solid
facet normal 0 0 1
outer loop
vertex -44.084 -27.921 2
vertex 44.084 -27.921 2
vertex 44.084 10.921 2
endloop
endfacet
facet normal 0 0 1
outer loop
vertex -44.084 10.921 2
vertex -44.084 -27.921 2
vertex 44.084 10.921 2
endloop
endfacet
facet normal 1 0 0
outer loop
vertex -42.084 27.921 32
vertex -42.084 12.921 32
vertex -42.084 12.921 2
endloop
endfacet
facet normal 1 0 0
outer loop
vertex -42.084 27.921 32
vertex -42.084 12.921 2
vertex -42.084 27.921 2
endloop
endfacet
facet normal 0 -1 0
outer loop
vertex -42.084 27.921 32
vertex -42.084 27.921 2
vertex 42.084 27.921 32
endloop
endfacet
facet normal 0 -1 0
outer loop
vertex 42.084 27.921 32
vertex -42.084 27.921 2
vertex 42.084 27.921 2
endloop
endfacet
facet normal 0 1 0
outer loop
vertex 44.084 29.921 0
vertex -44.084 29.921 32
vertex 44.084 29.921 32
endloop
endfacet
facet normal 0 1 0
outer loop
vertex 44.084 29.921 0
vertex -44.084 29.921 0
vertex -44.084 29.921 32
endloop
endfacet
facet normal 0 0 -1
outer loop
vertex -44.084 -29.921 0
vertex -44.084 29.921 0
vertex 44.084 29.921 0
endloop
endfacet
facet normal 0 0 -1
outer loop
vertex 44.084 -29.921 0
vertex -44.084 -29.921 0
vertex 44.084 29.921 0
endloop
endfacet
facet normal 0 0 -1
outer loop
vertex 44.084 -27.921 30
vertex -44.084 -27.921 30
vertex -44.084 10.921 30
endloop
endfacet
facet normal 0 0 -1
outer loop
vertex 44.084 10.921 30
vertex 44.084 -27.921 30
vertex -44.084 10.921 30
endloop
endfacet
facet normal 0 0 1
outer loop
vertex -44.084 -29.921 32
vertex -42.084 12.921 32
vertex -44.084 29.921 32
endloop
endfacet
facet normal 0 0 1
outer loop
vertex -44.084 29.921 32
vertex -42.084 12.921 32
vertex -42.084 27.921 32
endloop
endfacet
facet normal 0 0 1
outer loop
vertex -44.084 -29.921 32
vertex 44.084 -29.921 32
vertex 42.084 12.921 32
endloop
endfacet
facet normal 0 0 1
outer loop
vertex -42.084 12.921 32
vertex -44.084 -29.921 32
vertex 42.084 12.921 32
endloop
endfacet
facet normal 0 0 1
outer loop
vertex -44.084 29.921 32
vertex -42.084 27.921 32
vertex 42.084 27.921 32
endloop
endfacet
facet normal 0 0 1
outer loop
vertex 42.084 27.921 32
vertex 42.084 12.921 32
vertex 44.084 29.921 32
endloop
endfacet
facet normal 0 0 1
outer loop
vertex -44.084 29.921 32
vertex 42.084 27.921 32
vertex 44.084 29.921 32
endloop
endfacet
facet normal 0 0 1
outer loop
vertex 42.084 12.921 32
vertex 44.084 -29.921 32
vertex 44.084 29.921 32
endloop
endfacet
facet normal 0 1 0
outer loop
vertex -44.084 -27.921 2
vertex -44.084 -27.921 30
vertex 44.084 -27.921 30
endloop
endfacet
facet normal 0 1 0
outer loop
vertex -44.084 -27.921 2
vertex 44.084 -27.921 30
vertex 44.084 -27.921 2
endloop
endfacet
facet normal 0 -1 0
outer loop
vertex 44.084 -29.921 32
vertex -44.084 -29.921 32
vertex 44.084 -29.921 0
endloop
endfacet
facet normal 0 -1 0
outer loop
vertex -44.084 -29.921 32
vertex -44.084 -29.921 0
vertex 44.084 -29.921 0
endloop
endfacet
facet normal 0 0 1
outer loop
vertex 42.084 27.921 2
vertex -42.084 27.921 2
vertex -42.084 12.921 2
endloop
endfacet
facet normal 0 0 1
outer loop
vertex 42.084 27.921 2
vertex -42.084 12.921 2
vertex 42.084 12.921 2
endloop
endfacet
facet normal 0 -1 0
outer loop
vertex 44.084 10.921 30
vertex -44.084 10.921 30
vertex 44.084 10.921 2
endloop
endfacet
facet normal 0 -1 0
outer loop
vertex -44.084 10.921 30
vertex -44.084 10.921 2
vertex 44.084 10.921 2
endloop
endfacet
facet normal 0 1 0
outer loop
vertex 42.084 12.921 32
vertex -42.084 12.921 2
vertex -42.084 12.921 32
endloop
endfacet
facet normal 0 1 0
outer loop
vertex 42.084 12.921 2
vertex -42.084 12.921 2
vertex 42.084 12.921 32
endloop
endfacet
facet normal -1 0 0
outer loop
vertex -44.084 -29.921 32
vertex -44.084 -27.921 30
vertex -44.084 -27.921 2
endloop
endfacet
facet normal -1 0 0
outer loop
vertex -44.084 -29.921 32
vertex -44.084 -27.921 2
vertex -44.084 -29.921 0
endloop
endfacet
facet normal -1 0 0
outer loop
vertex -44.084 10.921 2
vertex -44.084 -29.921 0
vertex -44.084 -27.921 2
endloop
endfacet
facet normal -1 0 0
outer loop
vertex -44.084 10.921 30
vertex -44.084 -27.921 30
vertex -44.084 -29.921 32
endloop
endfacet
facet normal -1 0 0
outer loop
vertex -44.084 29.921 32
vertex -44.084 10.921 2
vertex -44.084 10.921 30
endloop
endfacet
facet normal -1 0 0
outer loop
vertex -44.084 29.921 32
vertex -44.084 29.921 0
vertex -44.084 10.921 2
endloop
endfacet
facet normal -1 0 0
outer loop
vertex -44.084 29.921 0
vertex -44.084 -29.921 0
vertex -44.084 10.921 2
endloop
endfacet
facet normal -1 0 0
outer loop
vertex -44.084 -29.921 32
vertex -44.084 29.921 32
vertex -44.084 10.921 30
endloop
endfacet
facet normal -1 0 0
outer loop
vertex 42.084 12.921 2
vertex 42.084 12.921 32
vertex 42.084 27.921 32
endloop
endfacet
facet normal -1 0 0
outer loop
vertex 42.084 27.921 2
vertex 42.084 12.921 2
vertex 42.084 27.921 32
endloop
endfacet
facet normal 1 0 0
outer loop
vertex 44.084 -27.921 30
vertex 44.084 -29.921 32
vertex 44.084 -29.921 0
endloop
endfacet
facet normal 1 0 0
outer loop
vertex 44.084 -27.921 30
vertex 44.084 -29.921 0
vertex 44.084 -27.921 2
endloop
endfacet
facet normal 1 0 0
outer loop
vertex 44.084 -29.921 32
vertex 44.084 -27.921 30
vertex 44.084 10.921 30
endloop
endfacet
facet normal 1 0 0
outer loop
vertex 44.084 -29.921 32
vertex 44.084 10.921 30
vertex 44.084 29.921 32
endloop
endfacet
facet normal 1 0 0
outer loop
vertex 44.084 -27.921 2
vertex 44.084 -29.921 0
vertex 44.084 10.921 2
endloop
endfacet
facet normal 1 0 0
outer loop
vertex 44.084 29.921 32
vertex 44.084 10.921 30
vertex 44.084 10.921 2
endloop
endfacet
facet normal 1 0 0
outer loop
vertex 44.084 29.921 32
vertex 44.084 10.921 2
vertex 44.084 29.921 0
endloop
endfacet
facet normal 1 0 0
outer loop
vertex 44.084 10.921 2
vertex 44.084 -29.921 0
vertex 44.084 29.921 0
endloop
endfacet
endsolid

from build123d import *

# Parameters (mm, degrees)
SKETCH1_W           = 88.168408076
SKETCH1_H           = 59.84281091
BOSS_EXTRUDE4_DEPTH = 2
SKETCH2_W           = 2
SKETCH2_H           = 59.84281091
BOSS_EXTRUDE5_DEPTH = 30
SKETCH3_W           = 84.168408076
SKETCH3_H           = 2
BOSS_EXTRUDE6_DEPTH = 30
SKETCH4_W           = 30
SKETCH4_H           = 38.84281091
CUT_EXTRUDE1_DEPTH  = 30
SKETCH5_W           = 2
SKETCH5_H           = 38.84281091
BOSS_EXTRUDE7_DEPTH = 86.168408075
SKETCH6_W           = 28
SKETCH6_H           = 38.84281091
CUT_EXTRUDE2_DEPTH  = 97.665842233


with BuildPart() as part:
    # Sketch1 → Boss-Extrude4 (new body)
    with BuildSketch(Plane.XY):
        Rectangle(SKETCH1_W, SKETCH1_H)
    extrude(amount=BOSS_EXTRUDE4_DEPTH)

    # Sketch2 → Boss-Extrude5 (add)
    with BuildSketch(Plane.XY.offset(2)):
        with Locations((-43.084204038, 0)):
            Rectangle(SKETCH2_W, SKETCH2_H)
        with Locations((43.084204038, 0)):
            Rectangle(SKETCH2_W, SKETCH2_H)
    extrude(amount=BOSS_EXTRUDE5_DEPTH)

    # Sketch3 → Boss-Extrude6 (add)
    with BuildSketch(Plane.XY.offset(2)):
        with Locations((0, 28.921405455)):
            Rectangle(SKETCH3_W, SKETCH3_H)
        with Locations((0, -28.921405455)):
            Rectangle(SKETCH3_W, SKETCH3_H)
        with Locations((0, 11.921405455)):
            Rectangle(SKETCH3_W, SKETCH3_H)
    extrude(amount=BOSS_EXTRUDE6_DEPTH)

    # Sketch4 → Cut-Extrude1 (cut)
    with BuildSketch(Plane(origin=(-42.084204038, 0, 0), x_dir=(0, 0, -1), z_dir=(1, 0, 0))):
        with Locations((-17, -8.5)):
            Rectangle(SKETCH4_W, SKETCH4_H)
    extrude(amount=-CUT_EXTRUDE1_DEPTH, mode=Mode.SUBTRACT)

    # Sketch5 → Boss-Extrude7 (add)
    with BuildSketch(Plane.ZY.offset(-42.084204038)):
        with Locations((31, -8.5)):
            Rectangle(SKETCH5_W, SKETCH5_H)
    extrude(amount=BOSS_EXTRUDE7_DEPTH)

    # Sketch6 → Cut-Extrude2 (cut, through all)
    with BuildSketch(Plane.ZY.offset(-42.084204038)):
        with Locations((16, -8.5)):
            Rectangle(SKETCH6_W, SKETCH6_H)
    extrude(amount=-CUT_EXTRUDE2_DEPTH, mode=Mode.SUBTRACT)


solid = part.part
